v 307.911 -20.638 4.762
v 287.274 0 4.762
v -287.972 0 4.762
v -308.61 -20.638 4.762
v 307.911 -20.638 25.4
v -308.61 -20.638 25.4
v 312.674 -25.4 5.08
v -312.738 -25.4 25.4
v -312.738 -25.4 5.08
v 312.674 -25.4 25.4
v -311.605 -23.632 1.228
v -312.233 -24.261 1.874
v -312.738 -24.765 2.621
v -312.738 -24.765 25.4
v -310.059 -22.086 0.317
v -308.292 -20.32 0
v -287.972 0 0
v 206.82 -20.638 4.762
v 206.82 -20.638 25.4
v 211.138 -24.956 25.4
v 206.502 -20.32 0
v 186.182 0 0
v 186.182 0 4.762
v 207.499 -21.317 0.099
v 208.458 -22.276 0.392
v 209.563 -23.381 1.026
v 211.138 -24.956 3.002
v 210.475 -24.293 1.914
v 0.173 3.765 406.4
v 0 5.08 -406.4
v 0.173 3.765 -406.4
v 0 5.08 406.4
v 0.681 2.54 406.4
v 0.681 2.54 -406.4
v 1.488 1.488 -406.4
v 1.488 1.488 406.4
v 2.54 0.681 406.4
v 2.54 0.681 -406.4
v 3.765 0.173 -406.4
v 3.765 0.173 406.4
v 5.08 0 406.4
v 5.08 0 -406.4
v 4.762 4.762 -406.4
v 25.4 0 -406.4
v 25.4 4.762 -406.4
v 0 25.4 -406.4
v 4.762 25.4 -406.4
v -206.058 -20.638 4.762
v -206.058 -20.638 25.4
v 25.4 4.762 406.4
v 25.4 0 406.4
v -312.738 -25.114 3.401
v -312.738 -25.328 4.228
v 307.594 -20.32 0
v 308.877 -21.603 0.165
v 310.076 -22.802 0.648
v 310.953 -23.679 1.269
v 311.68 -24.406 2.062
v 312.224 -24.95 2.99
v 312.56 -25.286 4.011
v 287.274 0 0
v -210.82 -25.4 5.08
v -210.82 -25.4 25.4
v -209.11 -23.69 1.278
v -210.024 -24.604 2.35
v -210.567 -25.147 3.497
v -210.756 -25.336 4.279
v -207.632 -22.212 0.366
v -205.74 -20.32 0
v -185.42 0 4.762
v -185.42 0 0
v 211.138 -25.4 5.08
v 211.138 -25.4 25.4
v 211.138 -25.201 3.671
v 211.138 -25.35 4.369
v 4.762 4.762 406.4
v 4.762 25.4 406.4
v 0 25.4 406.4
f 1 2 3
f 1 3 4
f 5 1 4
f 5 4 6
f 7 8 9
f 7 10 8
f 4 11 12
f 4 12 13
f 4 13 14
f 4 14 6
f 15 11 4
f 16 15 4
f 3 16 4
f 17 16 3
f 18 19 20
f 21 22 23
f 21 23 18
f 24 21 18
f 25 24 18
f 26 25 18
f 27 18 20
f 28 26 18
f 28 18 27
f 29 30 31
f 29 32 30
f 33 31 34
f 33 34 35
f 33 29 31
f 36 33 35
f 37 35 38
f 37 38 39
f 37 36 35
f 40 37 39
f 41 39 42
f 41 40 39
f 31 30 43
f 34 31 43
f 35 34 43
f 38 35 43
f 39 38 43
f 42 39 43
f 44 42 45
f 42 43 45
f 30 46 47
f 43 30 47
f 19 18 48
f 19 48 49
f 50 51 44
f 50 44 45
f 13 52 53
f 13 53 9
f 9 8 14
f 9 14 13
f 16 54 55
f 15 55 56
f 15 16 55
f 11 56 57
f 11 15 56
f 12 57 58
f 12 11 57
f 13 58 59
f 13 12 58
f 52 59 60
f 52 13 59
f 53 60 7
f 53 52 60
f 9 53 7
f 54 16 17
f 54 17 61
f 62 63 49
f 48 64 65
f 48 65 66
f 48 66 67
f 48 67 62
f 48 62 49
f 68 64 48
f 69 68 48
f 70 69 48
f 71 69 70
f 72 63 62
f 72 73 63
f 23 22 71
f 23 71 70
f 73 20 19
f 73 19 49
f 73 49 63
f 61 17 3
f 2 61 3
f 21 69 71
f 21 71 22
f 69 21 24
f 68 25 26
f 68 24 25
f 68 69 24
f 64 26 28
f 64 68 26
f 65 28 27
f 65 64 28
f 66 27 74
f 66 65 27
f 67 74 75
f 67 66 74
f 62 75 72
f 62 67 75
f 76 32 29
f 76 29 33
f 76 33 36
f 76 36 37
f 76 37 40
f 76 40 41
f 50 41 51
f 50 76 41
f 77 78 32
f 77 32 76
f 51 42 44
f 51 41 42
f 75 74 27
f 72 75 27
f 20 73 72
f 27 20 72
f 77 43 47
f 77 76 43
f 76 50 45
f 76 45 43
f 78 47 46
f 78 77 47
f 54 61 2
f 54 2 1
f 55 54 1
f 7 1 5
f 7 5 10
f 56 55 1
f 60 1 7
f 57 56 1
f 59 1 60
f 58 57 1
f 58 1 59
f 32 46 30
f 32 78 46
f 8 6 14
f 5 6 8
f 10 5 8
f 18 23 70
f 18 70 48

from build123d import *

# Parameters (mm, degrees)
F1_DEPTH  = 312.7375
F2_R      = 5.08
F4_DEPTH  = 152.4
F7_DEPTH  = 152.4
F8_ANGLE  = 90
F11_DEPTH = 211.1375
F12_R     = 5.08
F13_DEPTH = 152.4
F16_DEPTH = 152.4
F17_ANGLE = 90
F20_DEPTH = 406.4
F21_R     = 5.08


with BuildPart() as f1:
    # F0 (on Right) → F1 (new body, symmetric)
    with BuildSketch(Plane.YZ):
        Polygon((-25.4, 0), (0, 0), (0, 4.7625), (-20.6375, 4.7625), (-20.6375, 25.4), (-25.4, 25.4), align=None)
    extrude(amount=F1_DEPTH, both=True)

    # F2
    f2_edges = [f1.edges().sort_by_distance(p)[0] for p in [
        (0, -25.4, 0),
    ]]
    fillet(f2_edges, radius=F2_R)


with BuildPart() as f4:
    # F3 (on Top) → F4 (new body)
    with BuildSketch(Plane.XY):
        Polygon((-152.4, -152.4), (0, 0), (-152.4, 0), align=None)
    extrude(amount=F4_DEPTH)


with BuildPart() as f4_1:
    # F5: moved
    add(f4.part.moved(Location((-287.9725, 0, 0))))


with BuildPart() as f1_1:
    add(f1.part)

    # F6: cut F4
    add(f4_1.part, mode=Mode.SUBTRACT)


with BuildPart() as f7:
    # F3 (on Top) → F7 (new body)
    with BuildSketch(Plane.XY):
        Polygon((-152.4, -152.4), (0, 0), (-152.4, 0), align=None)
    extrude(amount=F7_DEPTH)


with BuildPart() as f7_1:
    # F8: moved
    add(f7.part.rotate(Axis((-152.4, 0, 76.2), (0, 0, -1)), F8_ANGLE))


with BuildPart() as f7_2:
    # F9: moved
    add(f7_1.part.moved(Location((592.074, 0, 0))))


with BuildPart() as f1_2:
    add(f1_1.part)

    # F10: cut F7
    add(f7_2.part, mode=Mode.SUBTRACT)


with BuildPart() as f11:
    # F0 (on Right) → F11 (new body, symmetric)
    with BuildSketch(Plane.YZ):
        Polygon((-25.4, 0), (0, 0), (0, 4.7625), (-20.6375, 4.7625), (-20.6375, 25.4), (-25.4, 25.4), align=None)
    extrude(amount=F11_DEPTH, both=True)

    # F12
    f12_edges = [f11.edges().sort_by_distance(p)[0] for p in [
        (0, -25.4, 0),
    ]]
    fillet(f12_edges, radius=F12_R)


with BuildPart() as f13:
    # F3 (on Top) → F13 (new body)
    with BuildSketch(Plane.XY):
        Polygon((-152.4, -152.4), (0, 0), (-152.4, 0), align=None)
    extrude(amount=F13_DEPTH)


with BuildPart() as f13_1:
    # F14: moved
    add(f13.part.moved(Location((-185.42, 0, 0))))


with BuildPart() as f11_1:
    add(f11.part)

    # F15: cut F13
    add(f13_1.part, mode=Mode.SUBTRACT)


with BuildPart() as f16:
    # F3 (on Top) → F16 (new body)
    with BuildSketch(Plane.XY):
        Polygon((-152.4, -152.4), (0, 0), (-152.4, 0), align=None)
    extrude(amount=F16_DEPTH)


with BuildPart() as f16_1:
    # F17: moved
    add(f16.part.rotate(Axis((-152.4, 0, 76.2), (0, 0, -1)), F17_ANGLE))


with BuildPart() as f16_2:
    # F18: moved
    add(f16_1.part.moved(Location((490.982, 0, 0))))


with BuildPart() as f11_2:
    add(f11_1.part)

    # F19: cut F16
    add(f16_2.part, mode=Mode.SUBTRACT)


with BuildPart() as f20:
    # F3 (on Top) → F20 (new body, symmetric)
    with BuildSketch(Plane.XY):
        Polygon((0, 25.4), (0, 0), (25.4, 0), (25.4, 4.7625), (4.7625, 4.7625), (4.7625, 25.4), align=None)
    extrude(amount=F20_DEPTH, both=True)

    # F21
    f21_edges = [f20.edges().sort_by_distance(p)[0] for p in [
        (0, 0, 0),
    ]]
    fillet(f21_edges, radius=F21_R)


solid = Compound([f1_2.part, f11_2.part, f20.part])
